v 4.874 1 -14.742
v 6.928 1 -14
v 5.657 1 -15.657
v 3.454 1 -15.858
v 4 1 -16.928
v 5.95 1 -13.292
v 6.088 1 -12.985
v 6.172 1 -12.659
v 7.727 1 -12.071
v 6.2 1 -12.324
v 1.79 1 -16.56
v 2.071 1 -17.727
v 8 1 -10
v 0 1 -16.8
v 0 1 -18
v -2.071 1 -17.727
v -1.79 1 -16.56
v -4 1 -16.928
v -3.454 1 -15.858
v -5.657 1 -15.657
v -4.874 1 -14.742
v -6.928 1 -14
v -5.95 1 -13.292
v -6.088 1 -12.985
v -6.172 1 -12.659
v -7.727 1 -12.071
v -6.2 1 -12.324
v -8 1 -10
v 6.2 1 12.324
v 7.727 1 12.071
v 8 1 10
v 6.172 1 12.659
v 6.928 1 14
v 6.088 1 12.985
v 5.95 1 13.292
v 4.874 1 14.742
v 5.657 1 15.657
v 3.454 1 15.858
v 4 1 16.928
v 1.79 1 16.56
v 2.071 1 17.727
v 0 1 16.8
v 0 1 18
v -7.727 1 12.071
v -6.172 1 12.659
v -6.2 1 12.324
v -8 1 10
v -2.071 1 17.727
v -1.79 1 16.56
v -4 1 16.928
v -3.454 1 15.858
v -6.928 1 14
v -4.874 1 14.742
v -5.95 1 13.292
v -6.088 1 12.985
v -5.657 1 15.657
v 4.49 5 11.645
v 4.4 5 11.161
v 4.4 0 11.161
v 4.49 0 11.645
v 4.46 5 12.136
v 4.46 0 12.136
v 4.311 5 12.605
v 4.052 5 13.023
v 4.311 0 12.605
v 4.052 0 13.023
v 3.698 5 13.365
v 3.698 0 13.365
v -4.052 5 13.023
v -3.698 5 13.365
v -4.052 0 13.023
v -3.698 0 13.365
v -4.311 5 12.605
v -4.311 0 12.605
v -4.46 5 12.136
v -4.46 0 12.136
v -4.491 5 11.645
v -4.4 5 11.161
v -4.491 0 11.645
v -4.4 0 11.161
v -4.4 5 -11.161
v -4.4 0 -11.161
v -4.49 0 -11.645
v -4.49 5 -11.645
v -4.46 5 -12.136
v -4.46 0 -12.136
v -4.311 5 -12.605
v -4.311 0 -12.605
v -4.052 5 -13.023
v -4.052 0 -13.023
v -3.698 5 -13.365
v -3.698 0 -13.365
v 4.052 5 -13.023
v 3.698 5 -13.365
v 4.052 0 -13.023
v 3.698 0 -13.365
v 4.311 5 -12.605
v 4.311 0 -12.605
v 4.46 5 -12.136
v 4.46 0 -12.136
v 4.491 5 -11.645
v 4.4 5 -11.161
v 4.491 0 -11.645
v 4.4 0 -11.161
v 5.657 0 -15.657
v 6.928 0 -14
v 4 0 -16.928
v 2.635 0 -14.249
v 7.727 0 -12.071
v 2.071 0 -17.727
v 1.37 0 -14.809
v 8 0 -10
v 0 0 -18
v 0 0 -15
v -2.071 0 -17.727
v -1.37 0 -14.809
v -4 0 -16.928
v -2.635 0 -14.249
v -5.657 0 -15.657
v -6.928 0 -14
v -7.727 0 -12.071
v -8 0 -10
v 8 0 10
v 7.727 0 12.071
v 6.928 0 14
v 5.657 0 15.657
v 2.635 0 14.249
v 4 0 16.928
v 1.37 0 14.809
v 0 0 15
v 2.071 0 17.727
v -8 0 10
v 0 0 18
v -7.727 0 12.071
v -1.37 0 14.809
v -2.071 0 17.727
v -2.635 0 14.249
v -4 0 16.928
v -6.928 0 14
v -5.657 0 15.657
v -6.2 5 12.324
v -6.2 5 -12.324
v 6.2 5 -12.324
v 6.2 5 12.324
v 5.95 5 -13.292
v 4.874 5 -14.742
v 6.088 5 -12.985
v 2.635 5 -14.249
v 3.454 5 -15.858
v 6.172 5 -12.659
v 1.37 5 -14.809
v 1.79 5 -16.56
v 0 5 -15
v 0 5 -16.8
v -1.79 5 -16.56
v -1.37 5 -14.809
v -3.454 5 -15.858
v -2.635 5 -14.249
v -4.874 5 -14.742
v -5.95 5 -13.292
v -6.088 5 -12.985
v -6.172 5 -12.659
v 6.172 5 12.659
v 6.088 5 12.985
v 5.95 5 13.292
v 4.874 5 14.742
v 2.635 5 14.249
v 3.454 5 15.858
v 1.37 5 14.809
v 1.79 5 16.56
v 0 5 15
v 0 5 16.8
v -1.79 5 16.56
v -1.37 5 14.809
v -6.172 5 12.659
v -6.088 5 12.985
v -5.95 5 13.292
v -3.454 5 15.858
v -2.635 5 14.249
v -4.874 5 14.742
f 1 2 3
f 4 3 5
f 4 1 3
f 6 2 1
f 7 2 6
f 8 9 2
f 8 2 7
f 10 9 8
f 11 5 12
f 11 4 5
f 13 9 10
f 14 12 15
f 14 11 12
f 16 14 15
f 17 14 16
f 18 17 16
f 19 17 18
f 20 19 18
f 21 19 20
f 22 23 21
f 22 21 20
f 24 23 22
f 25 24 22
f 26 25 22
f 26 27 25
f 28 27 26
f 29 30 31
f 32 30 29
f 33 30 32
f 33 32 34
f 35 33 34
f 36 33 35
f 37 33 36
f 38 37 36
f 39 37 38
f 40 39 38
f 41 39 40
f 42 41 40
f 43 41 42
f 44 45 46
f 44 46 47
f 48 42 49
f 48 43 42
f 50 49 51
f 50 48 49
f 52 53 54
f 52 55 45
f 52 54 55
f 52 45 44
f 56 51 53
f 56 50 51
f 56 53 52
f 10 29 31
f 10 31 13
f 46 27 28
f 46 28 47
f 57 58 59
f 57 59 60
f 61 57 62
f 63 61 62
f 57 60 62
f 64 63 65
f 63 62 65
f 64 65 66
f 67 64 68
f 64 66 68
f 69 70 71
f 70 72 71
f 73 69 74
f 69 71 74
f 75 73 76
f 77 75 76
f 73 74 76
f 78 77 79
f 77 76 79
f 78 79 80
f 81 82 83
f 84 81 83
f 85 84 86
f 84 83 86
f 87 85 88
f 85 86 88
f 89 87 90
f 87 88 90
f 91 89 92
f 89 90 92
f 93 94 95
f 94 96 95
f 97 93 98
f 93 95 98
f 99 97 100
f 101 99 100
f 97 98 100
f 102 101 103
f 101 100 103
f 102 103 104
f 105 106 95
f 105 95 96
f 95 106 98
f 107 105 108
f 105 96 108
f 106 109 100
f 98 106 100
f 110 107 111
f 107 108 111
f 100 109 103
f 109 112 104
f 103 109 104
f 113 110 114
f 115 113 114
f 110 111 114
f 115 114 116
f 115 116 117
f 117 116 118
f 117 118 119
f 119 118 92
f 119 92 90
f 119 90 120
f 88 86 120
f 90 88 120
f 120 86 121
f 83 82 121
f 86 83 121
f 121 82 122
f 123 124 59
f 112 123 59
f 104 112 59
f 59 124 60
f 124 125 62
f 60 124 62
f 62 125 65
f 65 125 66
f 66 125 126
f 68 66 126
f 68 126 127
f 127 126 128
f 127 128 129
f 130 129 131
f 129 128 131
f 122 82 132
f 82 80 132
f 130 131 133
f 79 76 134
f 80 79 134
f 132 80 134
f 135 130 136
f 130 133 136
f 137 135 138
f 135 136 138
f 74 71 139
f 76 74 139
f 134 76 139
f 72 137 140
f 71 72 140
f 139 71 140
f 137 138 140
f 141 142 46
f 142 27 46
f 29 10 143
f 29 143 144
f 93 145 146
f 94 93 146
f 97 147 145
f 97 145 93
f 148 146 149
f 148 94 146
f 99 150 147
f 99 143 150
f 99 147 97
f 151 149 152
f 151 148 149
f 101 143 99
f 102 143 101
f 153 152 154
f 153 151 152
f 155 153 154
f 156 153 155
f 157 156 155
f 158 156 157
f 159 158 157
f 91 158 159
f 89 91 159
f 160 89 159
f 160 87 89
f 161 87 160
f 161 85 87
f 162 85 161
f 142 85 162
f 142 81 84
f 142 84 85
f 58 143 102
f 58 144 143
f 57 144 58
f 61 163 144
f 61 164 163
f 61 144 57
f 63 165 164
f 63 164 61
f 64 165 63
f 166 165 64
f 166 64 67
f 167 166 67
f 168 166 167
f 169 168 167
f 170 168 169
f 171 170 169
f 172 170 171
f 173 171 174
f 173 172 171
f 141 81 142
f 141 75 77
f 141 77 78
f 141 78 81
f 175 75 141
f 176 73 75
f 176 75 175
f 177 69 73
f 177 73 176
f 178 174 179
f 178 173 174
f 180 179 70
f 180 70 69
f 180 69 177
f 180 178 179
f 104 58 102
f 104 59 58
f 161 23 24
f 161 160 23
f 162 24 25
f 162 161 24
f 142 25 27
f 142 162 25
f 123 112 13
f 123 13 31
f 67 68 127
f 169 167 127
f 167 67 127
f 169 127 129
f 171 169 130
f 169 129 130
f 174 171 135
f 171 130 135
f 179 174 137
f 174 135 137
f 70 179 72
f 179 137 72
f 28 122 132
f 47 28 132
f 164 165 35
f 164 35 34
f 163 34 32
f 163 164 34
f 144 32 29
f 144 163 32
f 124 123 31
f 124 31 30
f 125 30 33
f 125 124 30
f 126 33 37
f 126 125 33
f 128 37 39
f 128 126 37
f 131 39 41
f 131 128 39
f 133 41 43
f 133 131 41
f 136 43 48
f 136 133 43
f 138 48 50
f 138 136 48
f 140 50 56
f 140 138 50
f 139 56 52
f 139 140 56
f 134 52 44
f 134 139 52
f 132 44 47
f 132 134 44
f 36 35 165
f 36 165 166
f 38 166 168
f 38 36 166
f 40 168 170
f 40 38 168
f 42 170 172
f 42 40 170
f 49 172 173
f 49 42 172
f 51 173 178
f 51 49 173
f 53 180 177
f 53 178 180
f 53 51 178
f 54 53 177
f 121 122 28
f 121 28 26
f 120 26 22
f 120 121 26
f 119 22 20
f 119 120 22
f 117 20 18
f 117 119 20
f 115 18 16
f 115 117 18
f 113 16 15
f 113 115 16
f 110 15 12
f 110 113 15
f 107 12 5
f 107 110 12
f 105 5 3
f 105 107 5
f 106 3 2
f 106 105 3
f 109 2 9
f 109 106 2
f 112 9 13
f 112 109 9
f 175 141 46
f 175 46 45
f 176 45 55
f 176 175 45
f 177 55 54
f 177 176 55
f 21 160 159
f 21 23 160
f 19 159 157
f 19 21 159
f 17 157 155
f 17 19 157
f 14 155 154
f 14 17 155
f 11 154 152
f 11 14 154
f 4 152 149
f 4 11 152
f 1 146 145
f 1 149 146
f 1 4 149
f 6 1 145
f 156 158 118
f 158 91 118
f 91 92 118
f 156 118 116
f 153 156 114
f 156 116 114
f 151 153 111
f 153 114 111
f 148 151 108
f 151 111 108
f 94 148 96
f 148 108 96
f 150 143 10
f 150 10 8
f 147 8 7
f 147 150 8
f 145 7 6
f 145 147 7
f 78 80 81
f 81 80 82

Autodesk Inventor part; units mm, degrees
ref_plane "YZ Plane" through (0, 0, 0) normal (1, 0, 0) x (0, 1, 0)
ref_plane "XZ Plane" through (0, 0, 0) normal (0, 1, 0) x (-1, 0, 0)
ref_plane "XY Plane" through (0, 0, 0) normal (0, 0, 1) x (1, 0, 0)
sketch "Sketch1" plane through (0, 0, 0) normal (0, 1, 0) x (-1, 0, 0)
  line L0 (6.25, 12.8036) -> (6.25, -12.8036) construction
  arc A0 (6.25, 12.8036) -> (-6.25, 12.8036) centre (0, 10) ccw construction
  arc A1 (4.4, 12.3749) -> (-4.4, 12.3749) centre (0, 10) ccw
  line L1 (4.4, 12.3749) -> (4.4, -12.3749)
  line L2 (-6.25, 12.8036) -> (-6.25, -12.8036) construction
  arc A2 (-6.25, -12.8036) -> (6.25, -12.8036) centre (0, -10) ccw construction
  arc A3 (-4.4, -12.3749) -> (4.4, -12.3749) centre (0, -10) ccw
  line L3 (-8, 0) -> (8, 0) construction
  circle A4 centre (0, -10) radius 7 construction
  arc A5 (3.6981, -13.3651) -> (4.4, -11.1611) centre (2.4943, -11.768) ccw
  line L4 (-4.4, 12.3749) -> (-4.4, -12.3749)
  arc A6 (-4.4, -11.1611) -> (-3.6981, -13.3651) centre (-2.4943, -11.768) ccw
  arc A7 (4.4, 11.1611) -> (3.6981, 13.3651) centre (2.4943, 11.768) ccw
  arc A8 (-3.6981, 13.3651) -> (-4.4, 11.1611) centre (-2.4943, 11.768) ccw
  arc A9 (-8, -10) -> (8, -10) centre (0, -10) ccw
  line L5 (8, -10) -> (8, 10)
  arc A10 (8, 10) -> (-8, 10) centre (0, 10) ccw
  line L6 (0, 10) -> (0, -10)
  line L7 (6.2, -12.7928) -> (6.2, 12.7928)
  arc A11 (6.2, 12.7928) -> (-6.2, 12.7928) centre (0, 10) ccw
  line L8 (-6.2, -12.7928) -> (-6.2, 12.7928)
  arc A12 (-6.2, -12.7928) -> (6.2, -12.7928) centre (0, -10) ccw
  line L9 (-8, -10) -> (-8, 10)
  point P0 (0, 0)
  point P1 (0, 0)
  point P2 (-3.6981, -13.3651)
  point P3 (4.4, 11.1611)
  point P4 (-6.2, -12.7928)
  dimension "d5" = 12.5
  dimension "d0" = 14
  dimension "d1" = 2
  dimension "d2" = 1
  dimension "d3" = 20
  dimension "d4" = 8.8
  dimension "d7" = 1.85
  dimension "d8" = 5
  dimension "d14" = 0.05
  dimension "d15" = 0.05
extrude "Extrusion1" add sketch "Sketch1" along normal blind 5 contours A12 L8 A11 L7
extrude "Extrusion2" add sketch "Sketch1" along normal blind 1 contours L9 A10 L5 A9
fillet "Fillet1" radius 2 4 edges at (6.2, 3, 12.7928) (6.2, 3, -12.7928) (-6.2, 3, -12.7928) (-6.2, 3, 12.7928)
equation "\"d7\" = -0.5 * d4 + 0.5 * d5"
equation "\"d15\" = d14"
properties part number "SliderProtectionFrame" material "Aluminum 7075"
